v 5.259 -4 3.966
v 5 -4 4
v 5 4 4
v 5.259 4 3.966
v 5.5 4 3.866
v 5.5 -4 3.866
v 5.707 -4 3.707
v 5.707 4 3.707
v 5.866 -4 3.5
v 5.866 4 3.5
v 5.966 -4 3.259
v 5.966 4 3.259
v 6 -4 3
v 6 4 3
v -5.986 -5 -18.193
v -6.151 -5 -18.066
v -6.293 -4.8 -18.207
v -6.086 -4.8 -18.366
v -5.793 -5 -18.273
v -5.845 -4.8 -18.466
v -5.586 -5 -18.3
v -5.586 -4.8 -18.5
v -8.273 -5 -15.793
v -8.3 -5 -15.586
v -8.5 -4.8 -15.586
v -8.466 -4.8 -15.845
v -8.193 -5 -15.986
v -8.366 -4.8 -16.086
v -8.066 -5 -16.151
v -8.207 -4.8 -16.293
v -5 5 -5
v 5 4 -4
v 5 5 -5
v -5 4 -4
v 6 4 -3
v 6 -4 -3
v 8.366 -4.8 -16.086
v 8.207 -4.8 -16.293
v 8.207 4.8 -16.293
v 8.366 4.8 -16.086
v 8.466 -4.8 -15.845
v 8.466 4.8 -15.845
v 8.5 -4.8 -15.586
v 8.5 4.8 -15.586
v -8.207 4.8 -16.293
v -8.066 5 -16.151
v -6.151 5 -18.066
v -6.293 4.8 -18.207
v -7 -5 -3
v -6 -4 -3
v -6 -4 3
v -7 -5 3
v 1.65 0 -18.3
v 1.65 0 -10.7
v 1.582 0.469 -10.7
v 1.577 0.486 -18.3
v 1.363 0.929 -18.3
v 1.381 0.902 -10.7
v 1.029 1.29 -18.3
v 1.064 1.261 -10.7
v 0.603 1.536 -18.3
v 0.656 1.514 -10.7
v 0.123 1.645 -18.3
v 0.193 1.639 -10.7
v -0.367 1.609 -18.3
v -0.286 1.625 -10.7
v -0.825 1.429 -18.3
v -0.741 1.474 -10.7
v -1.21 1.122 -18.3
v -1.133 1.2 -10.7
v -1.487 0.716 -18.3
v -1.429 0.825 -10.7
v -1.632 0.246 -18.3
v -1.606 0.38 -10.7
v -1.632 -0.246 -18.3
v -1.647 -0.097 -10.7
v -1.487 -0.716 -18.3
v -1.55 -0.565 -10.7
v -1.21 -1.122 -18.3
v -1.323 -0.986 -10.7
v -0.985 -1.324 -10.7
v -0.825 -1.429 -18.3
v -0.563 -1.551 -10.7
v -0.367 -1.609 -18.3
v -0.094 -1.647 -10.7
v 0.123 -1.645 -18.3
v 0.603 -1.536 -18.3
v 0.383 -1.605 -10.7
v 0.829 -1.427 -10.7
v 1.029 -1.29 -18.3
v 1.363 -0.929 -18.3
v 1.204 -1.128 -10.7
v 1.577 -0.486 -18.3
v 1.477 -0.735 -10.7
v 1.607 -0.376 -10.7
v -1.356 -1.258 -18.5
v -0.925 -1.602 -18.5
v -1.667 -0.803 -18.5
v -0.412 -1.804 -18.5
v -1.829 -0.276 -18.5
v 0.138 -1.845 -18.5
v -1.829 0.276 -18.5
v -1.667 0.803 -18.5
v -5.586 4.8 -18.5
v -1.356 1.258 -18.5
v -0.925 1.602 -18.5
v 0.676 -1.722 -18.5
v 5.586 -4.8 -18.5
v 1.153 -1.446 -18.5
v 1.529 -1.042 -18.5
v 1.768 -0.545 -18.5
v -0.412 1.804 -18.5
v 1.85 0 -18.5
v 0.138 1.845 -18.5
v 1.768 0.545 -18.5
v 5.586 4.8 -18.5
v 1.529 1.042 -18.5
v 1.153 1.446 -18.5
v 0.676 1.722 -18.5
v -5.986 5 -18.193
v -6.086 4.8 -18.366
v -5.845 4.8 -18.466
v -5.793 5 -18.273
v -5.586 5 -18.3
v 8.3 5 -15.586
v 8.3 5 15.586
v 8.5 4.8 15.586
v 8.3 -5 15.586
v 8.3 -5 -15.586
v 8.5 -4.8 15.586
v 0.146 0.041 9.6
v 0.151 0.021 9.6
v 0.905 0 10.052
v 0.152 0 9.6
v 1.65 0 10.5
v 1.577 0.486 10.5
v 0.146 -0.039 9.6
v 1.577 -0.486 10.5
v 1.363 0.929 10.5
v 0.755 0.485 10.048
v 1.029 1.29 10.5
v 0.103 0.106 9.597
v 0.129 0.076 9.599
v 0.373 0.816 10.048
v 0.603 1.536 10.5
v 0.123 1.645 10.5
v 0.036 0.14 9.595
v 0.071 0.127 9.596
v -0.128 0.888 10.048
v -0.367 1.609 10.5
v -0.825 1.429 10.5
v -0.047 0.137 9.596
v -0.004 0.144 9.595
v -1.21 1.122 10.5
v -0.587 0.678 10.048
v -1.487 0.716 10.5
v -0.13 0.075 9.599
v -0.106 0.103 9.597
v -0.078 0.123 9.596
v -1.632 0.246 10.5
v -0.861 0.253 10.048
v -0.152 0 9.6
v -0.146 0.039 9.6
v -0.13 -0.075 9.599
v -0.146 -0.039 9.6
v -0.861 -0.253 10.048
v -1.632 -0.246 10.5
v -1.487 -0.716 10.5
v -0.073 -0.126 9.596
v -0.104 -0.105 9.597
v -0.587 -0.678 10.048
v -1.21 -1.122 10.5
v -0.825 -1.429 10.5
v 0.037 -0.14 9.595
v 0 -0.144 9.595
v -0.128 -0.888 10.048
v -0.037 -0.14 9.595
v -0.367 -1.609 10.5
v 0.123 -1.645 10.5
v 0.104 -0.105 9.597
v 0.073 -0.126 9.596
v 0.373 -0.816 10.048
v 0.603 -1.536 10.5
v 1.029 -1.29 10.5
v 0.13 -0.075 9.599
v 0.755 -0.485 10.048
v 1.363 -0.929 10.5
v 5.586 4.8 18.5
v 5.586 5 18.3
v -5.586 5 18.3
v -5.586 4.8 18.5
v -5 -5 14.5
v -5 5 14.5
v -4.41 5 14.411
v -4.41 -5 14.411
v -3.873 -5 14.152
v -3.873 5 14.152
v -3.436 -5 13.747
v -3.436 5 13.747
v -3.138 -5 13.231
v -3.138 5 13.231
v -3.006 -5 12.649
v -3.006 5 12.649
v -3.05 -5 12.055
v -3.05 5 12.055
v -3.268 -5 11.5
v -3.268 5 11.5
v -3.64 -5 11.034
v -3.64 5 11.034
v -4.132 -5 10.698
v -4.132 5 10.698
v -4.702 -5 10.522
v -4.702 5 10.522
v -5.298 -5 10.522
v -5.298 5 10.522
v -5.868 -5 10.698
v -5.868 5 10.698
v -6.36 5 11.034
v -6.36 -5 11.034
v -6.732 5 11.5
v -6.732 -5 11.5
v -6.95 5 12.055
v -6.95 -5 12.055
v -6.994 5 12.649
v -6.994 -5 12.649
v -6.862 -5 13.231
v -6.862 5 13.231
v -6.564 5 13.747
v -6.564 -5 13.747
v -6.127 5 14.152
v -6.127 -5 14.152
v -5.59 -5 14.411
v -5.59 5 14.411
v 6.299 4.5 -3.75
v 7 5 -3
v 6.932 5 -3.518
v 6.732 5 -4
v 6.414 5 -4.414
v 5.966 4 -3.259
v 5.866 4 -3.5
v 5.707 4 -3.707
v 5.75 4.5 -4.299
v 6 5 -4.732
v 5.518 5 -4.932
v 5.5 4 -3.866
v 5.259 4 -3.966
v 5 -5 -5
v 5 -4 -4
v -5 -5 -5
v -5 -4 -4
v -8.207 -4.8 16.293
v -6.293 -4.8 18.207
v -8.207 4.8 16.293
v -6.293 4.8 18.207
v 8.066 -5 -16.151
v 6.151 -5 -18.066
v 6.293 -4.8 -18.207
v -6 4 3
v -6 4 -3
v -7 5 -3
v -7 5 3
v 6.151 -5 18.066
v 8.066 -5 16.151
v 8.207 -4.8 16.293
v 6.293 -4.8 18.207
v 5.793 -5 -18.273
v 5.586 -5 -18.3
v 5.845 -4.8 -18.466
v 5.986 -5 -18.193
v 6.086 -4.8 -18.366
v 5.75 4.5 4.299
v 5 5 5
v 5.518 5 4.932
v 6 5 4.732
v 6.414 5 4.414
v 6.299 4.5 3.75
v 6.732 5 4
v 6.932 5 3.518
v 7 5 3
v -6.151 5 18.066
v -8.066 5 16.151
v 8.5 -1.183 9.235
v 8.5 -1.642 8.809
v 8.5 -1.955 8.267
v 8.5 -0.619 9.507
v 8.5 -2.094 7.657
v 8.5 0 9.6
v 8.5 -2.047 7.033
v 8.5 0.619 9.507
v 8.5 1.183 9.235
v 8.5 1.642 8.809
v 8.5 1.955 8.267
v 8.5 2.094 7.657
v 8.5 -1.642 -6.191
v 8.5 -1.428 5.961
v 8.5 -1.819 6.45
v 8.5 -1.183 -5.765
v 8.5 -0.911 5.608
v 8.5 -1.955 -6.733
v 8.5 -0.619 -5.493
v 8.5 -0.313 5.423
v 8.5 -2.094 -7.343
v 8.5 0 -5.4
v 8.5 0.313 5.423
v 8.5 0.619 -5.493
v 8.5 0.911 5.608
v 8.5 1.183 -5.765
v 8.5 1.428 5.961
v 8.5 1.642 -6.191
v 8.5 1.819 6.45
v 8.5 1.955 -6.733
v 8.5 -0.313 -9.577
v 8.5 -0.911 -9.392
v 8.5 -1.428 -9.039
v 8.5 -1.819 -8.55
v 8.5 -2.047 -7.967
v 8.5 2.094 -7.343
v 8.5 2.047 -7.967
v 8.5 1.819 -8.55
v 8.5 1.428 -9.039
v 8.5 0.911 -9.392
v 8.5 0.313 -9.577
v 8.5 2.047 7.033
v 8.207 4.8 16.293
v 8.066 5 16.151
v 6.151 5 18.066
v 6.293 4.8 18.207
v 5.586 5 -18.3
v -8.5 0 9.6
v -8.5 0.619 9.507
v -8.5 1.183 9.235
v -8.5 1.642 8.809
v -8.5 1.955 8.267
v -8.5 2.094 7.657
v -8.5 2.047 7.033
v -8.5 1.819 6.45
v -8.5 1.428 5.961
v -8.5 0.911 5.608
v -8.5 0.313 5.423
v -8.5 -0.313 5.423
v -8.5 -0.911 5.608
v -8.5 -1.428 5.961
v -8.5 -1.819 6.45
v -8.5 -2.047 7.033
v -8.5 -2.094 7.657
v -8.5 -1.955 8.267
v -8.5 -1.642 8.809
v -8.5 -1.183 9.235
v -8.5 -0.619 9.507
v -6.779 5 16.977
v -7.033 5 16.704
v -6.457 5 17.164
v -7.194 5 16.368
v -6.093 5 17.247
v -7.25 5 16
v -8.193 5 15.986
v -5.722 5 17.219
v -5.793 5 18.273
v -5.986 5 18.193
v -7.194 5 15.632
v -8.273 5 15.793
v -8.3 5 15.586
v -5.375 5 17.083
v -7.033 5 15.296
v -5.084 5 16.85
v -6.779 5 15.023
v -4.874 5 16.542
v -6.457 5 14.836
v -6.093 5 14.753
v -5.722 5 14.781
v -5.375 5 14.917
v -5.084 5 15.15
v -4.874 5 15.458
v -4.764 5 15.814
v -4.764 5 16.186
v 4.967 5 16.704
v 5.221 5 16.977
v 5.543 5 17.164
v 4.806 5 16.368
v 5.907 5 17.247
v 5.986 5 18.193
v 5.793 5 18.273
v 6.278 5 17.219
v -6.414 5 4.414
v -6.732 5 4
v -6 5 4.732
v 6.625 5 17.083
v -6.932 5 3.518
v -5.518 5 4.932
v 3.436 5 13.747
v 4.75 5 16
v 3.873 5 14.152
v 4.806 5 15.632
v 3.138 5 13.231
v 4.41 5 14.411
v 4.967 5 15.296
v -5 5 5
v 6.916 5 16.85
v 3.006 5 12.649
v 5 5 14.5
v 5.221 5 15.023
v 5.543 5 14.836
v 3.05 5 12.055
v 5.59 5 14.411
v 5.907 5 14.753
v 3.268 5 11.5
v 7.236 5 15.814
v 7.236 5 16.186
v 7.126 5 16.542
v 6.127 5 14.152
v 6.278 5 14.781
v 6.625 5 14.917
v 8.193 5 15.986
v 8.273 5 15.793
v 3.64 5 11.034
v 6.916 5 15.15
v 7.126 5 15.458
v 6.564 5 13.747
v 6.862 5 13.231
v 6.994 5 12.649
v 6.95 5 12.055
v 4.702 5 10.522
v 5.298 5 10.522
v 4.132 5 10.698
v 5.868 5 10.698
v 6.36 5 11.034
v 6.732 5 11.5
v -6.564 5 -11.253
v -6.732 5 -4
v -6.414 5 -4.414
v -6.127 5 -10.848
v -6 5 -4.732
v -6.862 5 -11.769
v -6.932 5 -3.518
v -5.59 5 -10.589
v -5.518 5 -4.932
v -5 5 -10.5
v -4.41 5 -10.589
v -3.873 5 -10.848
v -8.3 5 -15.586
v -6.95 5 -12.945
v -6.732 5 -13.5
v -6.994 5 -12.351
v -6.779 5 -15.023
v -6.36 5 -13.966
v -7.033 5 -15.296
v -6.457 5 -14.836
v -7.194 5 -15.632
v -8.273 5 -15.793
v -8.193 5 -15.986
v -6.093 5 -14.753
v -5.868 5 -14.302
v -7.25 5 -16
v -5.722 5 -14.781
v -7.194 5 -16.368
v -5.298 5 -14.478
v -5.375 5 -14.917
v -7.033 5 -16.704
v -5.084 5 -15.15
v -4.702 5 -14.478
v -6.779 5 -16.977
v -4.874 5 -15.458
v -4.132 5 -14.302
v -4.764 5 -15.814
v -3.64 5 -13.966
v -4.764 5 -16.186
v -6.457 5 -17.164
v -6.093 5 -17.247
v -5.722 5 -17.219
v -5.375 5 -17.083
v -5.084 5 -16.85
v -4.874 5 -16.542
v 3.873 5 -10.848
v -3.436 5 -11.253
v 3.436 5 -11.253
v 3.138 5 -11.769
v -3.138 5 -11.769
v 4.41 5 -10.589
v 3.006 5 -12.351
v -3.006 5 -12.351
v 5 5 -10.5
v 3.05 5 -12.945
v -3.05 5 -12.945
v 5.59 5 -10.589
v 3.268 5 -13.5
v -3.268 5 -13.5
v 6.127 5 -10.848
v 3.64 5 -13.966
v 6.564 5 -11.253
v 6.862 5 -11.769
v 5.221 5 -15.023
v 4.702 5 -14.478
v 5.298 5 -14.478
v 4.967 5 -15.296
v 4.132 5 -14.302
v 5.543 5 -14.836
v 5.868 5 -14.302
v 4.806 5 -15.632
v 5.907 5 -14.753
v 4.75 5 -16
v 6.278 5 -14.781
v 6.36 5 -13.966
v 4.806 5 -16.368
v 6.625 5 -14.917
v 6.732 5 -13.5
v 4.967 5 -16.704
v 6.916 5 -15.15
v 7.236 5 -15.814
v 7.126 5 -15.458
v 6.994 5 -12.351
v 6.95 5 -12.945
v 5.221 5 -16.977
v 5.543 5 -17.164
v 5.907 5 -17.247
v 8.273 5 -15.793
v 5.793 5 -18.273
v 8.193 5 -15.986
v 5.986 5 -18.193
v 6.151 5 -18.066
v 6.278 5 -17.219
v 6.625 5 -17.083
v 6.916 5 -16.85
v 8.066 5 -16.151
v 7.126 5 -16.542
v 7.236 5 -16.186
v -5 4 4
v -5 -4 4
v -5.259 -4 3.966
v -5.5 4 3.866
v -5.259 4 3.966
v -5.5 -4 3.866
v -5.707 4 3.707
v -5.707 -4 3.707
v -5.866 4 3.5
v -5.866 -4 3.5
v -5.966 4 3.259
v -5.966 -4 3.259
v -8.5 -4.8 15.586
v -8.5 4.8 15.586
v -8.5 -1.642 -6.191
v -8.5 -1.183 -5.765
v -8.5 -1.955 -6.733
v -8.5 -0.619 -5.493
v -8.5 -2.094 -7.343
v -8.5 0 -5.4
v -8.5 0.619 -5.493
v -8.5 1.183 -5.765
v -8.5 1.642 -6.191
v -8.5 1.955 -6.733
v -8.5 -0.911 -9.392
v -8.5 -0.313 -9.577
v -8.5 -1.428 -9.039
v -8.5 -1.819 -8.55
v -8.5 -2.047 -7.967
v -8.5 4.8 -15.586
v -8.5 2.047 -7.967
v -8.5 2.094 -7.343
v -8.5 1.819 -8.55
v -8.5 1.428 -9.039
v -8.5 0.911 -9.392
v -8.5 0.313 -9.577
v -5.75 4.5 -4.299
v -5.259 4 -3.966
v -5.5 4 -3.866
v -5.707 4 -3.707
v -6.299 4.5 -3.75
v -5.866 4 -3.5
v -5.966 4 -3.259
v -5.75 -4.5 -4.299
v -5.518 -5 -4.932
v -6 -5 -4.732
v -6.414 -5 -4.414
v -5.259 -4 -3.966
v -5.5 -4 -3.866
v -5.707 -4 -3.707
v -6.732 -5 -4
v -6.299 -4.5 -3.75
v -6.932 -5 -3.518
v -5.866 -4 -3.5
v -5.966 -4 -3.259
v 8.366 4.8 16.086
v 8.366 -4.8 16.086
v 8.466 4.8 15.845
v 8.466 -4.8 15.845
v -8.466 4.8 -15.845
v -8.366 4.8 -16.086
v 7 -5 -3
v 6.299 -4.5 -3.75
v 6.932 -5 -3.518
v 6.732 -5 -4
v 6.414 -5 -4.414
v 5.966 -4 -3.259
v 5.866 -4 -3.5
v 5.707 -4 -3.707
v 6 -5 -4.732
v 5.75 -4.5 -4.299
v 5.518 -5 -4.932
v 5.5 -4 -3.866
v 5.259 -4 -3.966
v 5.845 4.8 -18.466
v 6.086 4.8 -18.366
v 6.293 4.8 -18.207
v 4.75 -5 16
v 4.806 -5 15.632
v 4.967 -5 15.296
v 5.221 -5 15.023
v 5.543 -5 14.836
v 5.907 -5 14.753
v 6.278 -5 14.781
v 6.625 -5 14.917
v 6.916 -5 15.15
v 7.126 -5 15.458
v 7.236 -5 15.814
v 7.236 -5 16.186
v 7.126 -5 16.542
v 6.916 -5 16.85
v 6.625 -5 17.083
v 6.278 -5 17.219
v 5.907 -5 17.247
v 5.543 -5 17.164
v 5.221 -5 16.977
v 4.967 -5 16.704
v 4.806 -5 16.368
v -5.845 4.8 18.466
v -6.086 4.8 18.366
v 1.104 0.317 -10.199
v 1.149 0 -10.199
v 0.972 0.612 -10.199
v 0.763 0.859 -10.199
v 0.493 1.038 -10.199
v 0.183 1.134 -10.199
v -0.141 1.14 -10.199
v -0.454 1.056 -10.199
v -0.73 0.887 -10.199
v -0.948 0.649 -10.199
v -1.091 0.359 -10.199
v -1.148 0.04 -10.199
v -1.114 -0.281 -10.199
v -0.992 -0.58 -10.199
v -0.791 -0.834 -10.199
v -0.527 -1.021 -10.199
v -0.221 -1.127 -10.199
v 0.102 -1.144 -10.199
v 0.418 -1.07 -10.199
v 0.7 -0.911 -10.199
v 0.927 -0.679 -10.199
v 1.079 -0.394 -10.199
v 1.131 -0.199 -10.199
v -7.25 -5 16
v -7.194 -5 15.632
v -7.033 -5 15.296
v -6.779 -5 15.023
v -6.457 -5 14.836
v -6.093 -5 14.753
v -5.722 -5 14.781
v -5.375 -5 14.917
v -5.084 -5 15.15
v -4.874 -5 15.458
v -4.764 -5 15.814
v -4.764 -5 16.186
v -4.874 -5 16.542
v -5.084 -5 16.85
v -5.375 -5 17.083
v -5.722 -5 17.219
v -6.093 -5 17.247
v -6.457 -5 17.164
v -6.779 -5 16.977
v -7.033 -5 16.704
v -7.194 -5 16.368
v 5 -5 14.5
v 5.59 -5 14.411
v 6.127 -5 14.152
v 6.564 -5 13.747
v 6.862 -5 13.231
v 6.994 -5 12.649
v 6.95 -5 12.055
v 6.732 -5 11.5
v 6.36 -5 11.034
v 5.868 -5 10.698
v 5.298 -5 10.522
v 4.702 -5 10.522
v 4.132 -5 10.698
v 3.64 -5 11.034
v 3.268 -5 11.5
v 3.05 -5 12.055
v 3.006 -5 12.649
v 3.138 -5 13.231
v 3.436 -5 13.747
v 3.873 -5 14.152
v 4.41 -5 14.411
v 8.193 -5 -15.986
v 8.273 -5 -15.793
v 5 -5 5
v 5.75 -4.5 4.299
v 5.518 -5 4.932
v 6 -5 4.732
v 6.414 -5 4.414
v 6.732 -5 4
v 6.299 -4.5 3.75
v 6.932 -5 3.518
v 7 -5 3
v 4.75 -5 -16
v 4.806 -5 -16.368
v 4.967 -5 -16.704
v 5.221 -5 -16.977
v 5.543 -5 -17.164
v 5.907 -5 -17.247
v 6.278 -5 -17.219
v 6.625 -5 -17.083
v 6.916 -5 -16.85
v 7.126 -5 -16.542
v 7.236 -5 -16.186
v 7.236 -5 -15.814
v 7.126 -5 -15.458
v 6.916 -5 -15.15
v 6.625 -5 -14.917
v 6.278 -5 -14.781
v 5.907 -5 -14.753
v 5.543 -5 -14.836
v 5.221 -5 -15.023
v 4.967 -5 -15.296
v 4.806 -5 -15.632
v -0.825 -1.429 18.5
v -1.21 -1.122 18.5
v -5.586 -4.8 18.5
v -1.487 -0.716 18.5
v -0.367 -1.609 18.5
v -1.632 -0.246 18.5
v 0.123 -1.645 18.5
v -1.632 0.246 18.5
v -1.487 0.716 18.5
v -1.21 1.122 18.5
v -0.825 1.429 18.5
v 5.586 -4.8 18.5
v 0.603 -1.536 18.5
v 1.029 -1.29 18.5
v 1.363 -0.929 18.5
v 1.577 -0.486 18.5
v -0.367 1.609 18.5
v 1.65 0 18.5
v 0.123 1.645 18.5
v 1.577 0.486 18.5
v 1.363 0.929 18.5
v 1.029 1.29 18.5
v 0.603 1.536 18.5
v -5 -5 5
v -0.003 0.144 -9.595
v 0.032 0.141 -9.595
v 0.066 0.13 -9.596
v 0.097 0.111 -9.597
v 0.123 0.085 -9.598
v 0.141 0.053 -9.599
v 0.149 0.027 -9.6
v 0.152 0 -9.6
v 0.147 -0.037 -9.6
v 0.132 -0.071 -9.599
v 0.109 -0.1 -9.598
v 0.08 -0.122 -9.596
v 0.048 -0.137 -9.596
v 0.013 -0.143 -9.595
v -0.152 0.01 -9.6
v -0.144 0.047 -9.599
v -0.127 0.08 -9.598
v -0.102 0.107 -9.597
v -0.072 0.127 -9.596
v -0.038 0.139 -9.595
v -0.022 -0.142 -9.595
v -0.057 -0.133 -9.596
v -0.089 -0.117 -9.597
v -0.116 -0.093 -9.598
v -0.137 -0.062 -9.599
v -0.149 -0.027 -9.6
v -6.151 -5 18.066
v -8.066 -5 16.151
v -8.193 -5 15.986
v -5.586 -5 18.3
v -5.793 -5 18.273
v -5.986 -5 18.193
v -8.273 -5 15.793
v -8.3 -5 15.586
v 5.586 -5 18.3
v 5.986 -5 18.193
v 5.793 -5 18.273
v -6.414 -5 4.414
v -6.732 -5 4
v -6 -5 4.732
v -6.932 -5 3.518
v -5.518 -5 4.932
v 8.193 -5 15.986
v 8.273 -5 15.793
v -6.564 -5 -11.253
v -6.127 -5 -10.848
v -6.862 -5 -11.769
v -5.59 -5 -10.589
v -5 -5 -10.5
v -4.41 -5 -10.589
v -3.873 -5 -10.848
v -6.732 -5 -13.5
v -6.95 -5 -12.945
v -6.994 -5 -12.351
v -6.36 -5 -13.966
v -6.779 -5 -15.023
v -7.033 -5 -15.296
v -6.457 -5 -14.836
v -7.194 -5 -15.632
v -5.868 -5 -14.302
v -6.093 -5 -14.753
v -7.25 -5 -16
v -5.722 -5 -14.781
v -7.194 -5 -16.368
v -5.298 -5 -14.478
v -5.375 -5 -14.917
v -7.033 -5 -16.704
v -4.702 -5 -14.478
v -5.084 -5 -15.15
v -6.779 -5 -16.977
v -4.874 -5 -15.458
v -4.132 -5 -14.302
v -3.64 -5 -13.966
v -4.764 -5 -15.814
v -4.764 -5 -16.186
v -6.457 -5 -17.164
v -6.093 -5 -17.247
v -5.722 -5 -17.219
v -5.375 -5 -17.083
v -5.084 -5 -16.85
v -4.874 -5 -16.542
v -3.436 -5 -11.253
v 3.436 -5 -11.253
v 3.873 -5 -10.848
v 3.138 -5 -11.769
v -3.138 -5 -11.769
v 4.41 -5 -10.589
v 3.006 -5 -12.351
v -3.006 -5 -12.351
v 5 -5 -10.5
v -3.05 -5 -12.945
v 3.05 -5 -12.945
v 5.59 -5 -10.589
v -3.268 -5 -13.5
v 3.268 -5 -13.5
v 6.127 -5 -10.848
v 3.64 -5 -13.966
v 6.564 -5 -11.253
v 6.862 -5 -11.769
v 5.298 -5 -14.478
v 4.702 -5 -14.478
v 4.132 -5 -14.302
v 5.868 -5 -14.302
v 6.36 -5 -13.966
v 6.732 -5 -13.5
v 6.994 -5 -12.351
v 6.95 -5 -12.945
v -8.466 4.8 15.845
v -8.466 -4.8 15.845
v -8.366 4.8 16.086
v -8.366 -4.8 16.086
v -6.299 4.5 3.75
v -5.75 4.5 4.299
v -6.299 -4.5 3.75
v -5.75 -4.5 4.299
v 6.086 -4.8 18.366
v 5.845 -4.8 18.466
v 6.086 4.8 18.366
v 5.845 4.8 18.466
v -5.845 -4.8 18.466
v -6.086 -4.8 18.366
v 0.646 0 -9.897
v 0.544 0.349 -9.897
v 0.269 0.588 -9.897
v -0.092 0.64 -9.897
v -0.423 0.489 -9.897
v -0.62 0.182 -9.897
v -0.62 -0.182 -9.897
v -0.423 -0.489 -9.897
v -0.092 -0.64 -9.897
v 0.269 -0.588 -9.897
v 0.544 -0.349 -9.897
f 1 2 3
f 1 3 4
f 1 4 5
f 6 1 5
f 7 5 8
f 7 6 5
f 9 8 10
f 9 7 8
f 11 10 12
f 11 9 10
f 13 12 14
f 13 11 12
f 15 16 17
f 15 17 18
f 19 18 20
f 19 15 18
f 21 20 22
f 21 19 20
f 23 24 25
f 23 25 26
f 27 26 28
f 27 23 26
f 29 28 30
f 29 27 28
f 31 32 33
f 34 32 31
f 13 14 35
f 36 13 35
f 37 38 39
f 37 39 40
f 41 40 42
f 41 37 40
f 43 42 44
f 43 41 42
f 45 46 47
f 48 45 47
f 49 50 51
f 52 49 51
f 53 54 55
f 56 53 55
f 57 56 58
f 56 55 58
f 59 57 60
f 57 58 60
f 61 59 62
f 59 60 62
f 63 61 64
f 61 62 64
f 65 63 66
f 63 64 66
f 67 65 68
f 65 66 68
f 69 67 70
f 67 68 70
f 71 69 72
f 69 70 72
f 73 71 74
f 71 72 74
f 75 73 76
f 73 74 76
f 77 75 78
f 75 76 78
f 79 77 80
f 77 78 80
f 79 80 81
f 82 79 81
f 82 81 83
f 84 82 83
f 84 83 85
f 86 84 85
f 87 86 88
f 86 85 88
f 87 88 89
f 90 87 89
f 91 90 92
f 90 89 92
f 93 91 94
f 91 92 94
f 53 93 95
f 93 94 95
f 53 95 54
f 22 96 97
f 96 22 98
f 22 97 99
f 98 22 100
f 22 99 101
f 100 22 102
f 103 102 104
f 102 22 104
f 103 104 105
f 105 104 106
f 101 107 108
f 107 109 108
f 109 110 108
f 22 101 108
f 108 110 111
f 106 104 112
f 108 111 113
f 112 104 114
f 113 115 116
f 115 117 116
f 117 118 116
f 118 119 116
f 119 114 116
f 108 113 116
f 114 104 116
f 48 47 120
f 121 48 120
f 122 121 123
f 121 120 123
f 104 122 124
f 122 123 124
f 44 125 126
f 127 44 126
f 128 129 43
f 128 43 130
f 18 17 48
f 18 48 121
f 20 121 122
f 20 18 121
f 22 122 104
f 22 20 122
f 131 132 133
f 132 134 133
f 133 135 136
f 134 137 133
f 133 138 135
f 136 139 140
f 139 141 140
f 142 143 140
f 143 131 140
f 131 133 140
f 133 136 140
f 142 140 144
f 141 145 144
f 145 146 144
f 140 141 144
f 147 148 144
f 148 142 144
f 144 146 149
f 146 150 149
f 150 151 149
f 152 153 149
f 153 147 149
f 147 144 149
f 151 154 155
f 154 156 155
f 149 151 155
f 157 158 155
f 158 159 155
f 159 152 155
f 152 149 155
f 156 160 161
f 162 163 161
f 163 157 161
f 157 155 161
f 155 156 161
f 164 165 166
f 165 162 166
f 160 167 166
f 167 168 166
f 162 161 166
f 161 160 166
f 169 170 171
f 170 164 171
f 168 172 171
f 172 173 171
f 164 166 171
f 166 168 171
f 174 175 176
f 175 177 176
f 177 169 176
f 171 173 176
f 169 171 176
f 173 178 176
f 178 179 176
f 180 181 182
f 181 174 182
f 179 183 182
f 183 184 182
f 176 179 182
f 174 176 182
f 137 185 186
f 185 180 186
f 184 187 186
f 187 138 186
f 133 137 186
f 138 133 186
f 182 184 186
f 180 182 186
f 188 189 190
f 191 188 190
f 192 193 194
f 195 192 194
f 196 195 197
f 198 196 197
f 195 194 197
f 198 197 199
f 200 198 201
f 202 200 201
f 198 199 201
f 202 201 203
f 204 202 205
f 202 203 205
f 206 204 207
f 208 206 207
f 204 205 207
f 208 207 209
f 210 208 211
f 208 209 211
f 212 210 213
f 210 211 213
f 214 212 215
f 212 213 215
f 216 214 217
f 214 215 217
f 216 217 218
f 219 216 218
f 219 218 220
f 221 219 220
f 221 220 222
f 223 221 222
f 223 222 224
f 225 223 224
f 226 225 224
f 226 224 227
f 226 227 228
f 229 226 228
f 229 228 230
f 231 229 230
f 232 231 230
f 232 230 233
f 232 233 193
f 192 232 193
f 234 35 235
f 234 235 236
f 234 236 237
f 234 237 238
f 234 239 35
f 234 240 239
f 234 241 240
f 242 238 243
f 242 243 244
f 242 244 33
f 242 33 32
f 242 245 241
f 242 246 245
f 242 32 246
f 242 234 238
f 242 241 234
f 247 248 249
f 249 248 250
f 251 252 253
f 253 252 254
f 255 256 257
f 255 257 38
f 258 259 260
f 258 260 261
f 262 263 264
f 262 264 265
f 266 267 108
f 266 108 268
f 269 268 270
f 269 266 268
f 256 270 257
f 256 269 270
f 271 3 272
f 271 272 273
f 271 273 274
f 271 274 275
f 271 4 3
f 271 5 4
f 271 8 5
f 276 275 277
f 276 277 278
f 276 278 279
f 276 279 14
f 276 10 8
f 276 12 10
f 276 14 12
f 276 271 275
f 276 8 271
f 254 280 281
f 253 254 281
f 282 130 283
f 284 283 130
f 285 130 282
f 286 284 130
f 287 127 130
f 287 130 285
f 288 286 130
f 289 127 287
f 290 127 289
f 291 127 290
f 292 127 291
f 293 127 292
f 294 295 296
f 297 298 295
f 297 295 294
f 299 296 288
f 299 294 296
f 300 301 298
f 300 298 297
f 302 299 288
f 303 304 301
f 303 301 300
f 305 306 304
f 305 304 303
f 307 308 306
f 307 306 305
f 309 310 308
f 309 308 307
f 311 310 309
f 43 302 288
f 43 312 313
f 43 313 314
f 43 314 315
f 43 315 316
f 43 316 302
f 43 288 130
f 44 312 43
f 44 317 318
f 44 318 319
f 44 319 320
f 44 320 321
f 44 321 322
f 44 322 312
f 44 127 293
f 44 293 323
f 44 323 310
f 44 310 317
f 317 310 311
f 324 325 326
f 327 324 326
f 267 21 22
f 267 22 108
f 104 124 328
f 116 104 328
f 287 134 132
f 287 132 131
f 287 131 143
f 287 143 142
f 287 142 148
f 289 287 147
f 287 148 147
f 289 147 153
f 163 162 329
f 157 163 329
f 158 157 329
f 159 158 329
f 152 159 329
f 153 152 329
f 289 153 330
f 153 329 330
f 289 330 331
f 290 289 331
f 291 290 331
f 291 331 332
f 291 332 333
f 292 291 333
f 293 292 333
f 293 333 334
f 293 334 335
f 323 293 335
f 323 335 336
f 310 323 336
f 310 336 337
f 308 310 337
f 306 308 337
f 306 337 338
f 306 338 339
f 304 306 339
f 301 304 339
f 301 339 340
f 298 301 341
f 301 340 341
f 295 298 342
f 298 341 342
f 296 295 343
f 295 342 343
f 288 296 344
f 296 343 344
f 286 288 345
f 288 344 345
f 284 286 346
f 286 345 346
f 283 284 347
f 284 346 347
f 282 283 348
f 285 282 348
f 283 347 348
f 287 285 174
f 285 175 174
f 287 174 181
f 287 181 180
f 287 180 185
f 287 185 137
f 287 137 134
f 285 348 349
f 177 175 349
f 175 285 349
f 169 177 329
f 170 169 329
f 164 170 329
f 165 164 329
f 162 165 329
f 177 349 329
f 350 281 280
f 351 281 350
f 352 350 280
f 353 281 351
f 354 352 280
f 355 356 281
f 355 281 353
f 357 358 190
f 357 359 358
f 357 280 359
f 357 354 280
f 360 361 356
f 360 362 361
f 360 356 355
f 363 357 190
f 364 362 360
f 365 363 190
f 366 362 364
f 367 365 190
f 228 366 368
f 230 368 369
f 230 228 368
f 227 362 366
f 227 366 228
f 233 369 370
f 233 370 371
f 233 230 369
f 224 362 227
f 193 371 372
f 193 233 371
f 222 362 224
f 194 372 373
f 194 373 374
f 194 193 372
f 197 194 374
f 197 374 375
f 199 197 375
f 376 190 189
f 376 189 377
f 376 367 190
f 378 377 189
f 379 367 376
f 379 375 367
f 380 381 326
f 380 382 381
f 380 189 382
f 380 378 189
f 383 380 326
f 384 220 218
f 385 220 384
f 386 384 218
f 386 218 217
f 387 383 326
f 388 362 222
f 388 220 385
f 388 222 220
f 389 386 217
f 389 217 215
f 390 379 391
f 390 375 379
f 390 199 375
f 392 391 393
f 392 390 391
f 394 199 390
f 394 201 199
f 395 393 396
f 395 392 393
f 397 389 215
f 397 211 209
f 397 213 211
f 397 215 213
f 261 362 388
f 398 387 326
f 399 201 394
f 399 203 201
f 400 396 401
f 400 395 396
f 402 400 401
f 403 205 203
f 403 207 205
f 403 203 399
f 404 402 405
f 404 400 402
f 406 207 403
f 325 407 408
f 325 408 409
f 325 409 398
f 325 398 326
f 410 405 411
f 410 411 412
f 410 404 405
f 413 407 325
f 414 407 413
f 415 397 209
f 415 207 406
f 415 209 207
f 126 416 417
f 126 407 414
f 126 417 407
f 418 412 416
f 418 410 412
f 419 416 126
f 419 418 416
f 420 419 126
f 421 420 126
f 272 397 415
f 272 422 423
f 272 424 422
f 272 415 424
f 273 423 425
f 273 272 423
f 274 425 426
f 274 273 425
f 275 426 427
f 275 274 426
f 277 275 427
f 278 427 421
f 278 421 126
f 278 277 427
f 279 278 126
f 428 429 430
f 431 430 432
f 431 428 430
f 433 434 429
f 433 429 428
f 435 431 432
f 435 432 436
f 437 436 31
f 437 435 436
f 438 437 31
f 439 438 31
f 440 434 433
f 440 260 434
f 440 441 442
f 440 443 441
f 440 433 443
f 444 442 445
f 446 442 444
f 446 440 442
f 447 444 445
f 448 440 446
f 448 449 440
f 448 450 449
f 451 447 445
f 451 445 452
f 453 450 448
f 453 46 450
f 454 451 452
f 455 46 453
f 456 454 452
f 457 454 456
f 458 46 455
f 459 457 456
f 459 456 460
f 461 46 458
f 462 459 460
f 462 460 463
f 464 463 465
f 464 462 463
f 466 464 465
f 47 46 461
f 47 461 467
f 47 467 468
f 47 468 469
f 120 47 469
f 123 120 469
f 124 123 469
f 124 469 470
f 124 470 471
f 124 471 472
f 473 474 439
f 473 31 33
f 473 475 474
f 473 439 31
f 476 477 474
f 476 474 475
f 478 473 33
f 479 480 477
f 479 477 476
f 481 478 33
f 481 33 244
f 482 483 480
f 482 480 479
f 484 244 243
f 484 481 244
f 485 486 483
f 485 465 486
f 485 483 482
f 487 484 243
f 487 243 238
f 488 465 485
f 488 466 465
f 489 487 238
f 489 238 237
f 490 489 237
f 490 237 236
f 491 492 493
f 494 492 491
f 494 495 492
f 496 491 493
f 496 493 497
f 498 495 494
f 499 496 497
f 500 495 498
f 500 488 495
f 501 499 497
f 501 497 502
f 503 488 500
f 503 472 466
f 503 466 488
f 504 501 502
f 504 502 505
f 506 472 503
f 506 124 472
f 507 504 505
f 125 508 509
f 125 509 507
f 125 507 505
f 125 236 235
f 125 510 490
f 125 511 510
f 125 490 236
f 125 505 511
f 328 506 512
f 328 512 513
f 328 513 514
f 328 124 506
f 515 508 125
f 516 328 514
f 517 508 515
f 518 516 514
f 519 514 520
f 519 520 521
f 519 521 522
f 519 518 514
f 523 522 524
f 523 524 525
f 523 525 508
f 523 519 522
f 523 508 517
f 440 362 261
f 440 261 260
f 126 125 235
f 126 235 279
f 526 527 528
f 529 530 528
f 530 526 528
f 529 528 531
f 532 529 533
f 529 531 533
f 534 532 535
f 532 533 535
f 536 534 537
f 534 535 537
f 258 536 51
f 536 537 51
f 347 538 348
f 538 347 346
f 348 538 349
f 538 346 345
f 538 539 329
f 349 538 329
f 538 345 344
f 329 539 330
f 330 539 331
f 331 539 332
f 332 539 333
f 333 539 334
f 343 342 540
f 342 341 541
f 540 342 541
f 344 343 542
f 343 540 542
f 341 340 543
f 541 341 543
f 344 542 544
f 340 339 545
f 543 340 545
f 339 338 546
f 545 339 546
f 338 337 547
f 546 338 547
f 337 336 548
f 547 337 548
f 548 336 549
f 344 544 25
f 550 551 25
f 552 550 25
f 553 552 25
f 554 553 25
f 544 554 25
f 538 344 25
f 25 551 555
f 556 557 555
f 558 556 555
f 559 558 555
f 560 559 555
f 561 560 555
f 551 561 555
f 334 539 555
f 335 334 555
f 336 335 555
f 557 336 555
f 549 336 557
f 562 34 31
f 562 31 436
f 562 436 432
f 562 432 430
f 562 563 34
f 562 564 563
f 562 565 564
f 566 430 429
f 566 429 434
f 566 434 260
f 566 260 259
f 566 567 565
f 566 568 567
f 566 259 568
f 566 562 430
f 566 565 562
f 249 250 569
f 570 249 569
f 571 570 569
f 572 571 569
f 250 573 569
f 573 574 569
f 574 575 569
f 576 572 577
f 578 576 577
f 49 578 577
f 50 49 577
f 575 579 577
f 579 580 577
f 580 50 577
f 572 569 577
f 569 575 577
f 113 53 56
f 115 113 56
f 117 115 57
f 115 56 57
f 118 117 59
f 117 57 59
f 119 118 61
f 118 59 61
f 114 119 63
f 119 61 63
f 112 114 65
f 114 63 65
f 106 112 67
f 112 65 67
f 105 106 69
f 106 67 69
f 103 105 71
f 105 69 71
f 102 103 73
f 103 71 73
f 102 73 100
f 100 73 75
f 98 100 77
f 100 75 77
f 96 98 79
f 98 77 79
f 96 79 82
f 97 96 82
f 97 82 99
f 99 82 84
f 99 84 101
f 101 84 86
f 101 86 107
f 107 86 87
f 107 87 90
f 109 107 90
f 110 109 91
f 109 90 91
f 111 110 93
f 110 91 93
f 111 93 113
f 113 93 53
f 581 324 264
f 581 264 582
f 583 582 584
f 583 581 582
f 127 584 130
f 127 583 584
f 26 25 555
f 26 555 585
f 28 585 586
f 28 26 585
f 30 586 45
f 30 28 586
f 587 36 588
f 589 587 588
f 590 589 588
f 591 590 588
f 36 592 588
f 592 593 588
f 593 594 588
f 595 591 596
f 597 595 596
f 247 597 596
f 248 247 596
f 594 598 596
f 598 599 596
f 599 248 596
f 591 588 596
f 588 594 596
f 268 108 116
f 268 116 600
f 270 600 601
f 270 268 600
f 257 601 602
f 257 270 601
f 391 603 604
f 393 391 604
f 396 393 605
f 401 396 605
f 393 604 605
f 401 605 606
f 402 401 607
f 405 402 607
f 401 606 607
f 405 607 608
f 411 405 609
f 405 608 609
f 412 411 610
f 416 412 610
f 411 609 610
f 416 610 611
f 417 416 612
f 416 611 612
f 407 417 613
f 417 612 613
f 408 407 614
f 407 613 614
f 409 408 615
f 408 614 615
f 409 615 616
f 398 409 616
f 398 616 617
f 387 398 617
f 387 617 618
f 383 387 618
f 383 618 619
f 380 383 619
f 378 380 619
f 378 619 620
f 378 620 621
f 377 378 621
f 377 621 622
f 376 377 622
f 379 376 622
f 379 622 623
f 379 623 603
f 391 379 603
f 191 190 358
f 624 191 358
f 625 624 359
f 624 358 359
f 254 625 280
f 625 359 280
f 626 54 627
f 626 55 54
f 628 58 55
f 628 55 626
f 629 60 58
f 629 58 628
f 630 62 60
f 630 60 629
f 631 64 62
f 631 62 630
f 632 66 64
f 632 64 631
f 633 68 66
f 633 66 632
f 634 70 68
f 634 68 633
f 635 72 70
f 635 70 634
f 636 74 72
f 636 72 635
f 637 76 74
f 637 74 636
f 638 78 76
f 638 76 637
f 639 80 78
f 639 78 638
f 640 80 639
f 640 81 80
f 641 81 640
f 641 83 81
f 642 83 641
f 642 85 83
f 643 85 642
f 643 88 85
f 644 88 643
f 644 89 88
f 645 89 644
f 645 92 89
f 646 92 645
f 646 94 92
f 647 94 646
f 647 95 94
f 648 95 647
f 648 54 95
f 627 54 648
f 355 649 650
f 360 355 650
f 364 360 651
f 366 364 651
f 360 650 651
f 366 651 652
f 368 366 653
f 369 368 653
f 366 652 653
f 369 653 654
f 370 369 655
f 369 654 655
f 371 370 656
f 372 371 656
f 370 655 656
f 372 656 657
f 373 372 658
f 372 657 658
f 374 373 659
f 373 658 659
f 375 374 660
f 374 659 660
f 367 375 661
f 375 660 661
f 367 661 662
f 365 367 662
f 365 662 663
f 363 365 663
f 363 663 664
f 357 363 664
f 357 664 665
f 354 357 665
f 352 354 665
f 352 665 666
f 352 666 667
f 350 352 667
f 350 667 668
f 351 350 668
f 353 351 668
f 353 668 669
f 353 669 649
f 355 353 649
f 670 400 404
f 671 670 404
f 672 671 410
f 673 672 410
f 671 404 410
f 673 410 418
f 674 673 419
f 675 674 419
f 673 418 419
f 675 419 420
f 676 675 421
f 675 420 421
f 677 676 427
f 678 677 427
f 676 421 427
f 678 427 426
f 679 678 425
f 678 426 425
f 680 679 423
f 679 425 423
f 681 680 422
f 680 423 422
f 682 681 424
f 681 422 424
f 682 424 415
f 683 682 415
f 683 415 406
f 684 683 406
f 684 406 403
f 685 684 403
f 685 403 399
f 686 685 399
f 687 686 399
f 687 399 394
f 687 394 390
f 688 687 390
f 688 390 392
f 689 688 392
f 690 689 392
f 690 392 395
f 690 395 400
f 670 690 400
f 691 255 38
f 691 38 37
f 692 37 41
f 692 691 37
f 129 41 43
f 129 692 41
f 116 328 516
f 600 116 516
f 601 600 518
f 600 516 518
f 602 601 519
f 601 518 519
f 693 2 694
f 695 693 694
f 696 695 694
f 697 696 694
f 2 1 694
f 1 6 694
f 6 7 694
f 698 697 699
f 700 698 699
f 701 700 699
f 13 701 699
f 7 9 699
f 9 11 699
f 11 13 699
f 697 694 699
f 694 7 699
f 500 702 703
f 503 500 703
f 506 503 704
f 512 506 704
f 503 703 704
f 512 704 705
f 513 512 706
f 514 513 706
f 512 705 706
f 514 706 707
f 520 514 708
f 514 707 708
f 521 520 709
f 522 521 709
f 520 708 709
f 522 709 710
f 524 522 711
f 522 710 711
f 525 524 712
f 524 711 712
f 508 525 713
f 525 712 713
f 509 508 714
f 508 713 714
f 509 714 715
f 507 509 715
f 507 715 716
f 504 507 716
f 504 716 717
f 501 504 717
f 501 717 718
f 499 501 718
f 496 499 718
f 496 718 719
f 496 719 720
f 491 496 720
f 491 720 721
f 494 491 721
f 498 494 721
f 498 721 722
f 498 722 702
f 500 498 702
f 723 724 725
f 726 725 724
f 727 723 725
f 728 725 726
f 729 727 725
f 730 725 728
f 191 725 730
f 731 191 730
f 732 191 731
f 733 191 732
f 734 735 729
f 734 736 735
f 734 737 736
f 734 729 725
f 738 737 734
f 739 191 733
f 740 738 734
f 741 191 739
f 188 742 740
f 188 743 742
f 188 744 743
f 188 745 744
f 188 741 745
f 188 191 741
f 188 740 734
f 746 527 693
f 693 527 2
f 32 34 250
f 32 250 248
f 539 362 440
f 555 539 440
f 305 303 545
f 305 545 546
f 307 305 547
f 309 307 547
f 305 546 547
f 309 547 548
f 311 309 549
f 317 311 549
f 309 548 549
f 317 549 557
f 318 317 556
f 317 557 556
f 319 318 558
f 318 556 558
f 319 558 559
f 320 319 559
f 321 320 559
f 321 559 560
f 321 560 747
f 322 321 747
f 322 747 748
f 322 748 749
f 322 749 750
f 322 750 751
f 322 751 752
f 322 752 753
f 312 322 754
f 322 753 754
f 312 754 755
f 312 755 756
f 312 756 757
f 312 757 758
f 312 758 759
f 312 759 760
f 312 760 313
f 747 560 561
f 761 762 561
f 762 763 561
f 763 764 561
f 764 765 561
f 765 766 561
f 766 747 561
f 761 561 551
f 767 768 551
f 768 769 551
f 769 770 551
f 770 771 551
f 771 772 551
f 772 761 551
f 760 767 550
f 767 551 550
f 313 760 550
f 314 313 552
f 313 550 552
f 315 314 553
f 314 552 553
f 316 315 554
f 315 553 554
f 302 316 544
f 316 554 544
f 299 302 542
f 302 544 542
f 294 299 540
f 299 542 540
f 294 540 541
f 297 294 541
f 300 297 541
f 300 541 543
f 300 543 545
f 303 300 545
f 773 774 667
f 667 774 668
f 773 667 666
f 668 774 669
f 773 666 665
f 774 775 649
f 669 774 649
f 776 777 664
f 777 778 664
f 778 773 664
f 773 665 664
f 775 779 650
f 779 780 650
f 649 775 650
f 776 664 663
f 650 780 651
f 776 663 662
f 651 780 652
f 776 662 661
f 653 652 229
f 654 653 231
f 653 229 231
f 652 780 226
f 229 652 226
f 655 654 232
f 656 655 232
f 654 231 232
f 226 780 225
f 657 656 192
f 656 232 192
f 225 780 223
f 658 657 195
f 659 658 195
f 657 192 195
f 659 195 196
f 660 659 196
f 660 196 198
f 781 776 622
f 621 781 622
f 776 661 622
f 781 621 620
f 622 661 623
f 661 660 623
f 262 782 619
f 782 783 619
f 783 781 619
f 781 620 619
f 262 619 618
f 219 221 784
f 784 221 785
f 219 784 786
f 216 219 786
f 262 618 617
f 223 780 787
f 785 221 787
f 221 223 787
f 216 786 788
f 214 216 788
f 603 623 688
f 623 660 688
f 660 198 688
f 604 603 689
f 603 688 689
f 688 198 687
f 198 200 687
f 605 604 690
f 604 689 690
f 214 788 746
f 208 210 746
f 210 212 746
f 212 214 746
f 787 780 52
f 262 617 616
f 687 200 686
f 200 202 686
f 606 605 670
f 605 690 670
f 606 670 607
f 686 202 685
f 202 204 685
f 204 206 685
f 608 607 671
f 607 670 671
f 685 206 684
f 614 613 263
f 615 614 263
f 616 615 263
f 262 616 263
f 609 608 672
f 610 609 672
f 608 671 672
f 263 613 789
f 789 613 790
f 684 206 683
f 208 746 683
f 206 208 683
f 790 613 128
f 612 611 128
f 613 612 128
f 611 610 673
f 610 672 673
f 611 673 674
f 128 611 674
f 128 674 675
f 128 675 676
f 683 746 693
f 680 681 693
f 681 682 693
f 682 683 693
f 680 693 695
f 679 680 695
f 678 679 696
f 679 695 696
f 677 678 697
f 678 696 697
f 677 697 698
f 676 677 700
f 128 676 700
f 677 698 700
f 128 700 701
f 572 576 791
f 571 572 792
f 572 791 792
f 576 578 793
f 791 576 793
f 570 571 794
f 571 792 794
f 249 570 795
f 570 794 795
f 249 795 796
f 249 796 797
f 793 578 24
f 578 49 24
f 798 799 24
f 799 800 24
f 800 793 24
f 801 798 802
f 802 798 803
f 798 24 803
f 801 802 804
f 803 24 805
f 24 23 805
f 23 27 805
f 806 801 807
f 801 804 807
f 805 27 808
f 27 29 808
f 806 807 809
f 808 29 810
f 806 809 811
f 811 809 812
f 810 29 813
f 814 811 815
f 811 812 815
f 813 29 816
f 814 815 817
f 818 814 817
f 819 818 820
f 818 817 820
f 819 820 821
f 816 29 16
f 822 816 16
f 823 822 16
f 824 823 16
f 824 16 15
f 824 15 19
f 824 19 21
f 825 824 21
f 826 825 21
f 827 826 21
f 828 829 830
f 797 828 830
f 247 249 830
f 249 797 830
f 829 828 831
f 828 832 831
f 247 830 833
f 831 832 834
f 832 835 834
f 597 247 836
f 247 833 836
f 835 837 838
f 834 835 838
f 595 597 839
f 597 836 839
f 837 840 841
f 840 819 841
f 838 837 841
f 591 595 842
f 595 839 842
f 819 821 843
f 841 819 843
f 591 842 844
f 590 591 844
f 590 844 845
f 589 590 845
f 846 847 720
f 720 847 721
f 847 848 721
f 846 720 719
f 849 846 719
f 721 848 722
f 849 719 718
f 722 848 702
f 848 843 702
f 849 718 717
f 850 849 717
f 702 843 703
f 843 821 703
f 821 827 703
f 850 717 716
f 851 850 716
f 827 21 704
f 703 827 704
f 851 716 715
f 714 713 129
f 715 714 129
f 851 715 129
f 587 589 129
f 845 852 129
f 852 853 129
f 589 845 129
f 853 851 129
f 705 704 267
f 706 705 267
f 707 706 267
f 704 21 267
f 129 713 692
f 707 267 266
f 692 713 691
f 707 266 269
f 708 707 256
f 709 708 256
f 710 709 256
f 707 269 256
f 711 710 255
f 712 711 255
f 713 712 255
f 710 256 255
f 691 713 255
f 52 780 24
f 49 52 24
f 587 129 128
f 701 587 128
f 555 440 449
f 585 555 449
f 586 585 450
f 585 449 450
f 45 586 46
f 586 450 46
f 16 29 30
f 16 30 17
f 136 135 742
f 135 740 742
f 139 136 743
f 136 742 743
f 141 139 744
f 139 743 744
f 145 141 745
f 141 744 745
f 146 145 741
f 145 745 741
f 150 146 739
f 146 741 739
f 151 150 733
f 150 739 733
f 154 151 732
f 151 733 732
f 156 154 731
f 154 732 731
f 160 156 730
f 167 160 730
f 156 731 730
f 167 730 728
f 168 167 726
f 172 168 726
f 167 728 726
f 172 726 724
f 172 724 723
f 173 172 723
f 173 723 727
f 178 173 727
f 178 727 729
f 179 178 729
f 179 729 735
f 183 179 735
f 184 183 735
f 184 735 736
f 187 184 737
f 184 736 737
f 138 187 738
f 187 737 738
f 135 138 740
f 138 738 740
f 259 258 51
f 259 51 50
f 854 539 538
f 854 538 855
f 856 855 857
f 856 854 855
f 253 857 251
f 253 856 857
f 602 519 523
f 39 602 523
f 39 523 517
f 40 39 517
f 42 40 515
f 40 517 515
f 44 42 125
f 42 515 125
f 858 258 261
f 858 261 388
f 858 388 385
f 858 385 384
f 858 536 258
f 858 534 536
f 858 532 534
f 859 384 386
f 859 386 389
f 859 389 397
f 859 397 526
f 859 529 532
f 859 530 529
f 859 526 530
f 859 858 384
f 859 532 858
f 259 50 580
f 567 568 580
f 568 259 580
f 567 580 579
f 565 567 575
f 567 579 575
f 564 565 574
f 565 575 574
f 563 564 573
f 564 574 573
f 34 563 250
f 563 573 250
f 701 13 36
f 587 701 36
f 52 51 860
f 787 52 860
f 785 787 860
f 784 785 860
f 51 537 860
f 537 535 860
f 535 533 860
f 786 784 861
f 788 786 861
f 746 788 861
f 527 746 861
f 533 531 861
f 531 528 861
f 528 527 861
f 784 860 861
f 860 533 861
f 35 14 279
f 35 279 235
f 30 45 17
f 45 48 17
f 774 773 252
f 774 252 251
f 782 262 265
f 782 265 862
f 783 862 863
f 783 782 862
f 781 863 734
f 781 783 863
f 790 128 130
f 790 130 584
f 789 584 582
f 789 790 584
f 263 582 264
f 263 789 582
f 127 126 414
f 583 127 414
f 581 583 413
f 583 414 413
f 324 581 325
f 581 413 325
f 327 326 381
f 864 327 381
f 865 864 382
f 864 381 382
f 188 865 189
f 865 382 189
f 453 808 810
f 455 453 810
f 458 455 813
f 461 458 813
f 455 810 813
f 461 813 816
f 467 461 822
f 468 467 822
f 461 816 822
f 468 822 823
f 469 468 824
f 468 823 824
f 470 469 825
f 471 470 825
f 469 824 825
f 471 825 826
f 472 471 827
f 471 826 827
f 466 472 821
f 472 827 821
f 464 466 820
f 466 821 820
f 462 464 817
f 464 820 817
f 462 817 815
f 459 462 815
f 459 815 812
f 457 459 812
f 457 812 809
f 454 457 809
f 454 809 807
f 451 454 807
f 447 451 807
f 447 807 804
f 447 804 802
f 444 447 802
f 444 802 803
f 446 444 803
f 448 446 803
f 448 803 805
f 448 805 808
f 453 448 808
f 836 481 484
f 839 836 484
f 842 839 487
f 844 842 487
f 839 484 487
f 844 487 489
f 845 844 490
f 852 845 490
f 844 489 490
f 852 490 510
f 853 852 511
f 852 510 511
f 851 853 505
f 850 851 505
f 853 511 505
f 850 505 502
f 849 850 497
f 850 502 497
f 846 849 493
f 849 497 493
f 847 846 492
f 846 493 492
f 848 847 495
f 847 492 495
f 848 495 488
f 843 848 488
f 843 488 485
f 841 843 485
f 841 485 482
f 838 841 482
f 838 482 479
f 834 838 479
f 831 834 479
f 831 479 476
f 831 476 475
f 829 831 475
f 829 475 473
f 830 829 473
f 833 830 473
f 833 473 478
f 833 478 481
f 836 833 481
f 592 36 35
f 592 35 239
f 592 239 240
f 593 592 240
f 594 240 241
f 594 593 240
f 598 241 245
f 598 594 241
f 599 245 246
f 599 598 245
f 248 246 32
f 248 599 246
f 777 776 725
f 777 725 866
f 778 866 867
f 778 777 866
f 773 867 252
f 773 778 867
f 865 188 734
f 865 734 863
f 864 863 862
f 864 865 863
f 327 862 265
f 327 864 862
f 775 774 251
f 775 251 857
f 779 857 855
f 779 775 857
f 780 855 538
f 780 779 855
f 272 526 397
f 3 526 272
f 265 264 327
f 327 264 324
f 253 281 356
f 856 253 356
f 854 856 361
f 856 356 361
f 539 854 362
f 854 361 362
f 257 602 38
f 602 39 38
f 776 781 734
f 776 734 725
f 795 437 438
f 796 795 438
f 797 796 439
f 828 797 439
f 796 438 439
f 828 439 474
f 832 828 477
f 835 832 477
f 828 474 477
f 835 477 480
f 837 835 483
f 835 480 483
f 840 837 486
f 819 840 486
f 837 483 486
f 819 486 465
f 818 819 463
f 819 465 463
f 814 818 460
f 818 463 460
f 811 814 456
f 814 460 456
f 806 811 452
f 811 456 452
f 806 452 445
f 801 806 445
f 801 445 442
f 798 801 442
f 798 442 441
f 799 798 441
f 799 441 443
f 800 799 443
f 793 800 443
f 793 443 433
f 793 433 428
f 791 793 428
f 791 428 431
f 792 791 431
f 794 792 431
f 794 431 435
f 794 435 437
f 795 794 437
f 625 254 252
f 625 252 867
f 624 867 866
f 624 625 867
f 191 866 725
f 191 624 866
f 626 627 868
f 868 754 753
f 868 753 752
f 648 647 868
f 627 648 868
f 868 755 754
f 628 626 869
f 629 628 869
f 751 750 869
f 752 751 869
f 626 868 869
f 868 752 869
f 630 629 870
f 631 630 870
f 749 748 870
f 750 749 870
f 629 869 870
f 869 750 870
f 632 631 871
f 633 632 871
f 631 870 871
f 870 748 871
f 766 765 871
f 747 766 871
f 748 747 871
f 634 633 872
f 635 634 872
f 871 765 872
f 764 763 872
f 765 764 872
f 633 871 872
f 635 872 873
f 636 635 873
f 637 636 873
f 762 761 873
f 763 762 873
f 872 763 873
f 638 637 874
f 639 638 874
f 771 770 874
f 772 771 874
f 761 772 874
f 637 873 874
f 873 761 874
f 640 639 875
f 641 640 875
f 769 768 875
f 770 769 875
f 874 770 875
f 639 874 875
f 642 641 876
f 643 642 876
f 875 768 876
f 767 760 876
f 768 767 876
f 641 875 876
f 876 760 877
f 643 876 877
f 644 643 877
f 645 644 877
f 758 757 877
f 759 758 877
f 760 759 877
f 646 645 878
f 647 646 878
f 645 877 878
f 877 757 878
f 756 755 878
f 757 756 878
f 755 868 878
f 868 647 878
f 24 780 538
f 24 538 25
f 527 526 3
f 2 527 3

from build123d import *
from OCP.BRepFilletAPI import BRepFilletAPI_MakeChamfer

# Parameters (mm, degrees)
SKETCH_1_W          = 17
SKETCH_1_H          = 37
EXTRUDE_1_DEPTH     = 5
SKETCH_2_R          = 1.5
CUT_EXTRUDE_1_DEPTH = 26.617376915
SKETCH_3_R          = 1.6
CUT_EXTRUDE_3_DEPTH = 8
SKETCH_4_R          = 1
SKETCH_4_W          = 12
SKETCH_4_H          = 8
CUT_EXTRUDE_4_DEPTH = 23.682592444
CHAMFER_1_SIZE      = 2.5
SKETCH_6_R          = 2
CUT_EXTRUDE_5_DEPTH = 23.682592444
FILLET_1_R          = 1
HOLE_WIZARD_M3_1_D  = 2.5
CHAMFER_2_SIZE      = 0.2
CHAMFER_2_SIZE2     = 0.584574438
CHAMFER_3_SIZE      = 0.2
CHAMFER_4_SIZE      = 1
HOLE_WIZARD_M5_1_D  = 4.2


# Read off the part's stored shape, not the designer's step: M4 螺纹孔1
with BuildPart() as part:
    # 草图1 → 凸台-拉伸1 (new, symmetric)
    with BuildSketch(Plane(origin=(0, 0, 0), x_dir=(1, 0, 0), z_dir=(0, 1, 0))):
        Rectangle(SKETCH_1_W, SKETCH_1_H)
    extrude(amount=EXTRUDE_1_DEPTH, both=True)

    # 草图2 → 切除-拉伸1 (cut, through all)
    with BuildSketch(Plane(origin=(8.5, 0, 0), x_dir=(0, 0, -1), z_dir=(1, 0, 0))):
        with Locations((-7.5, 0)):
            Circle(SKETCH_2_R)
        with Locations((7.5, 0)):
            Circle(SKETCH_2_R)
    extrude(amount=-CUT_EXTRUDE_1_DEPTH, mode=Mode.SUBTRACT)

    # 草图3 → 切除-拉伸3 (cut)
    with BuildSketch(Plane(origin=(0, 0, -18.5), x_dir=(-1, 0, 0), z_dir=(0, 0, -1))):
        Circle(SKETCH_3_R)
    cut_extrude_3 = extrude(amount=-CUT_EXTRUDE_3_DEPTH, mode=Mode.SUBTRACT)

    # 草图4 → 切除-拉伸4 (cut, through all)
    with BuildSketch(Plane(origin=(0, 5, 0), x_dir=(1, 0, 0), z_dir=(0, 1, 0))):
        with Locations(Location((-6, -16, 0), (0, 0, 270))):
            Circle(SKETCH_4_R)
        with Locations(Location((6, -16, 0), (0, 0, 270))):
            Circle(SKETCH_4_R)
        with Locations(Location((6, 16, 0), (0, 0, 270))):
            Circle(SKETCH_4_R)
        with Locations(Location((-6, 16, 0), (0, 0, 270))):
            Circle(SKETCH_4_R)
        Rectangle(SKETCH_4_W, SKETCH_4_H)
    extrude(amount=-CUT_EXTRUDE_4_DEPTH, mode=Mode.SUBTRACT)

    # 镜向1: 切除-拉伸3 across plane
    add(cut_extrude_3.mirror(Plane.XY), mode=Mode.SUBTRACT)

    # 倒角1
    chamfer_1_edges = [part.edges().sort_by_distance(p)[0] for p in [
        (8.5, 0, 18.5),
        (-8.5, 0, 18.5),
        (-8.5, 0, -18.5),
        (8.5, 0, -18.5),
    ]]
    chamfer(chamfer_1_edges, length=CHAMFER_1_SIZE)

    # 草图6 → 切除-拉伸5 (cut, through all)
    with BuildSketch(Plane(origin=(0, 5, 0), x_dir=(1, 0, 0), z_dir=(0, 1, 0))):
        with Locations(Location((5, 12.5, 0), (0, 0, 270))):
            Circle(SKETCH_6_R)
        with Locations(Location((-5, 12.5, 0), (0, 0, 270))):
            Circle(SKETCH_6_R)
        with Locations(Location((5, -12.5, 0), (0, 0, 270))):
            Circle(SKETCH_6_R)
        with Locations(Location((-5, -12.5, 0), (0, 0, 270))):
            Circle(SKETCH_6_R)
    extrude(amount=-CUT_EXTRUDE_5_DEPTH, mode=Mode.SUBTRACT)

    # 圆角1
    fillet_1_edges = [part.edges().sort_by_distance(p)[0] for p in [
        (6, 0, -4),
        (6, 0, 4),
        (-6, 0, 4),
        (-6, 0, -4),
        (-8.5, 0, 16),
        (-8.5, 0, -16),
        (6, 0, -18.5),
        (-6, 0, -18.5),
        (8.5, 0, 16),
        (8.5, 0, -16),
        (-6, 0, 18.5),
        (6, 0, 18.5),
    ]]
    fillet(fillet_1_edges, radius=FILLET_1_R)

    # M4 螺纹孔1 outline → M4 螺纹孔1 (revolve, cut)
    with BuildSketch(Plane.XZ):
        Polygon((0, -9.508579979), (0, -10.5), (1.6, -10.5), (1.6, -18.5), (1.65, -18.5), (1.65, -10.5), align=None)
        Polygon((0, 10.5), (0, 9.508579979), (1.65, 10.5), (1.65, 18.5), (1.6, 18.5), (1.6, 10.5), align=None)
    revolve(axis=Axis((0, 0, 0), (0, 0, 1)), mode=Mode.SUBTRACT)

    # M3 螺纹孔1 (through all)
    with Locations(Plane(origin=(0, 5, 0), x_dir=(1, 0, 0), z_dir=(0, 1, 0))):
        with Locations((-6, -16), (6, -16), (6, 16), (-6, 16)):
            Hole(HOLE_WIZARD_M3_1_D / 2)

    # 倒角2: one chamfer whose edges measure the first distance from different faces: ONE call of the kernel's chamfer builder (chamfer() names one face for all edges)
    chamfer_2_edges_1 = [part.edges().sort_by_distance(p)[0] for p in [
        (-8.5, 5, 0),
        (0, 5, -18.5),
        (-7.25, 5, -17.25),
        (-7.25, 5, 17.25),
        (0, 5, 18.5),
        (7.25, 5, 17.25),
        (8.5, 5, 0),
        (7.25, 5, -17.25),
        (5.96846987, 5, 18.423879533),
        (-8.423879533, 5, -15.96846987),
        (-5.96846987, 5, -18.423879533),
        (5.96846987, 5, -18.423879533),
        (8.423879533, 5, -15.96846987),
        (8.423879533, 5, 15.96846987),
        (-5.96846987, 5, 18.423879533),
        (-8.423879533, 5, 15.96846987),
        (-1.65, 0, -18.5),
    ]]
    chamfer_2_edges_2 = [part.edges().sort_by_distance(p)[0] for p in [
        (-1.65, 0, -10.5),
    ]]
    chamfer_2_side_2 = [part.faces().sort_by_distance(p)[0] for p in [
        (-1.65, 0, -14.5),
    ]]
    chamfer_2 = BRepFilletAPI_MakeChamfer(part.part.solid().wrapped)
    for e in chamfer_2_edges_1:
        chamfer_2.Add(CHAMFER_2_SIZE, e.wrapped)
    for e in chamfer_2_edges_2:
        chamfer_2.Add(CHAMFER_2_SIZE, CHAMFER_2_SIZE2, e.wrapped, chamfer_2_side_2[0].wrapped)  # the first distance lies on this face
    add(Compound.cast(chamfer_2.Shape()), mode=Mode.REPLACE)

    # 倒角3
    chamfer_3_edges = [part.edges().sort_by_distance(p)[0] for p in [
        (-8.5, -5, 0),
        (-7.25, -5, 17.25),
        (-7.25, -5, -17.25),
        (0, -5, -18.5),
        (7.25, -5, -17.25),
        (8.5, -5, 0),
        (7.25, -5, 17.25),
        (0, -5, 18.5),
        (5.96846987, -5, 18.423879533),
        (-8.423879533, -5, -15.96846987),
        (-5.96846987, -5, -18.423879533),
        (5.96846987, -5, -18.423879533),
        (8.423879533, -5, -15.96846987),
        (8.423879533, -5, 15.96846987),
        (-5.96846987, -5, 18.423879533),
        (-8.423879533, -5, 15.96846987),
    ]]
    chamfer(chamfer_3_edges, length=CHAMFER_3_SIZE)

    # 倒角4
    chamfer_4_edges = [part.edges().sort_by_distance(p)[0] for p in [
        (6, 5, 0),
        (0, 5, 4),
        (-6, 5, 0),
        (0, 5, -4),
        (0, -5, 4),
        (6, -5, 0),
        (0, -5, -4),
        (-6, -5, 0),
        (-5.707106781, 5, 3.707106781),
        (-5.707106781, -5, 3.707106781),
        (-5.707106781, 5, -3.707106781),
        (-5.707106781, -5, -3.707106781),
        (5.707106781, 5, -3.707106781),
        (5.707106781, -5, -3.707106781),
        (5.707106781, 5, 3.707106781),
        (5.707106781, -5, 3.707106781),
    ]]
    chamfer(chamfer_4_edges, length=CHAMFER_4_SIZE)

    # M5 螺纹孔1 (through all)
    with Locations(Plane(origin=(8.5, 0, 0), x_dir=(0, 0, -1), z_dir=(1, 0, 0))):
        with Locations((-7.5, 0), (7.5, 0)):
            Hole(HOLE_WIZARD_M5_1_D / 2)


solid = part.part
